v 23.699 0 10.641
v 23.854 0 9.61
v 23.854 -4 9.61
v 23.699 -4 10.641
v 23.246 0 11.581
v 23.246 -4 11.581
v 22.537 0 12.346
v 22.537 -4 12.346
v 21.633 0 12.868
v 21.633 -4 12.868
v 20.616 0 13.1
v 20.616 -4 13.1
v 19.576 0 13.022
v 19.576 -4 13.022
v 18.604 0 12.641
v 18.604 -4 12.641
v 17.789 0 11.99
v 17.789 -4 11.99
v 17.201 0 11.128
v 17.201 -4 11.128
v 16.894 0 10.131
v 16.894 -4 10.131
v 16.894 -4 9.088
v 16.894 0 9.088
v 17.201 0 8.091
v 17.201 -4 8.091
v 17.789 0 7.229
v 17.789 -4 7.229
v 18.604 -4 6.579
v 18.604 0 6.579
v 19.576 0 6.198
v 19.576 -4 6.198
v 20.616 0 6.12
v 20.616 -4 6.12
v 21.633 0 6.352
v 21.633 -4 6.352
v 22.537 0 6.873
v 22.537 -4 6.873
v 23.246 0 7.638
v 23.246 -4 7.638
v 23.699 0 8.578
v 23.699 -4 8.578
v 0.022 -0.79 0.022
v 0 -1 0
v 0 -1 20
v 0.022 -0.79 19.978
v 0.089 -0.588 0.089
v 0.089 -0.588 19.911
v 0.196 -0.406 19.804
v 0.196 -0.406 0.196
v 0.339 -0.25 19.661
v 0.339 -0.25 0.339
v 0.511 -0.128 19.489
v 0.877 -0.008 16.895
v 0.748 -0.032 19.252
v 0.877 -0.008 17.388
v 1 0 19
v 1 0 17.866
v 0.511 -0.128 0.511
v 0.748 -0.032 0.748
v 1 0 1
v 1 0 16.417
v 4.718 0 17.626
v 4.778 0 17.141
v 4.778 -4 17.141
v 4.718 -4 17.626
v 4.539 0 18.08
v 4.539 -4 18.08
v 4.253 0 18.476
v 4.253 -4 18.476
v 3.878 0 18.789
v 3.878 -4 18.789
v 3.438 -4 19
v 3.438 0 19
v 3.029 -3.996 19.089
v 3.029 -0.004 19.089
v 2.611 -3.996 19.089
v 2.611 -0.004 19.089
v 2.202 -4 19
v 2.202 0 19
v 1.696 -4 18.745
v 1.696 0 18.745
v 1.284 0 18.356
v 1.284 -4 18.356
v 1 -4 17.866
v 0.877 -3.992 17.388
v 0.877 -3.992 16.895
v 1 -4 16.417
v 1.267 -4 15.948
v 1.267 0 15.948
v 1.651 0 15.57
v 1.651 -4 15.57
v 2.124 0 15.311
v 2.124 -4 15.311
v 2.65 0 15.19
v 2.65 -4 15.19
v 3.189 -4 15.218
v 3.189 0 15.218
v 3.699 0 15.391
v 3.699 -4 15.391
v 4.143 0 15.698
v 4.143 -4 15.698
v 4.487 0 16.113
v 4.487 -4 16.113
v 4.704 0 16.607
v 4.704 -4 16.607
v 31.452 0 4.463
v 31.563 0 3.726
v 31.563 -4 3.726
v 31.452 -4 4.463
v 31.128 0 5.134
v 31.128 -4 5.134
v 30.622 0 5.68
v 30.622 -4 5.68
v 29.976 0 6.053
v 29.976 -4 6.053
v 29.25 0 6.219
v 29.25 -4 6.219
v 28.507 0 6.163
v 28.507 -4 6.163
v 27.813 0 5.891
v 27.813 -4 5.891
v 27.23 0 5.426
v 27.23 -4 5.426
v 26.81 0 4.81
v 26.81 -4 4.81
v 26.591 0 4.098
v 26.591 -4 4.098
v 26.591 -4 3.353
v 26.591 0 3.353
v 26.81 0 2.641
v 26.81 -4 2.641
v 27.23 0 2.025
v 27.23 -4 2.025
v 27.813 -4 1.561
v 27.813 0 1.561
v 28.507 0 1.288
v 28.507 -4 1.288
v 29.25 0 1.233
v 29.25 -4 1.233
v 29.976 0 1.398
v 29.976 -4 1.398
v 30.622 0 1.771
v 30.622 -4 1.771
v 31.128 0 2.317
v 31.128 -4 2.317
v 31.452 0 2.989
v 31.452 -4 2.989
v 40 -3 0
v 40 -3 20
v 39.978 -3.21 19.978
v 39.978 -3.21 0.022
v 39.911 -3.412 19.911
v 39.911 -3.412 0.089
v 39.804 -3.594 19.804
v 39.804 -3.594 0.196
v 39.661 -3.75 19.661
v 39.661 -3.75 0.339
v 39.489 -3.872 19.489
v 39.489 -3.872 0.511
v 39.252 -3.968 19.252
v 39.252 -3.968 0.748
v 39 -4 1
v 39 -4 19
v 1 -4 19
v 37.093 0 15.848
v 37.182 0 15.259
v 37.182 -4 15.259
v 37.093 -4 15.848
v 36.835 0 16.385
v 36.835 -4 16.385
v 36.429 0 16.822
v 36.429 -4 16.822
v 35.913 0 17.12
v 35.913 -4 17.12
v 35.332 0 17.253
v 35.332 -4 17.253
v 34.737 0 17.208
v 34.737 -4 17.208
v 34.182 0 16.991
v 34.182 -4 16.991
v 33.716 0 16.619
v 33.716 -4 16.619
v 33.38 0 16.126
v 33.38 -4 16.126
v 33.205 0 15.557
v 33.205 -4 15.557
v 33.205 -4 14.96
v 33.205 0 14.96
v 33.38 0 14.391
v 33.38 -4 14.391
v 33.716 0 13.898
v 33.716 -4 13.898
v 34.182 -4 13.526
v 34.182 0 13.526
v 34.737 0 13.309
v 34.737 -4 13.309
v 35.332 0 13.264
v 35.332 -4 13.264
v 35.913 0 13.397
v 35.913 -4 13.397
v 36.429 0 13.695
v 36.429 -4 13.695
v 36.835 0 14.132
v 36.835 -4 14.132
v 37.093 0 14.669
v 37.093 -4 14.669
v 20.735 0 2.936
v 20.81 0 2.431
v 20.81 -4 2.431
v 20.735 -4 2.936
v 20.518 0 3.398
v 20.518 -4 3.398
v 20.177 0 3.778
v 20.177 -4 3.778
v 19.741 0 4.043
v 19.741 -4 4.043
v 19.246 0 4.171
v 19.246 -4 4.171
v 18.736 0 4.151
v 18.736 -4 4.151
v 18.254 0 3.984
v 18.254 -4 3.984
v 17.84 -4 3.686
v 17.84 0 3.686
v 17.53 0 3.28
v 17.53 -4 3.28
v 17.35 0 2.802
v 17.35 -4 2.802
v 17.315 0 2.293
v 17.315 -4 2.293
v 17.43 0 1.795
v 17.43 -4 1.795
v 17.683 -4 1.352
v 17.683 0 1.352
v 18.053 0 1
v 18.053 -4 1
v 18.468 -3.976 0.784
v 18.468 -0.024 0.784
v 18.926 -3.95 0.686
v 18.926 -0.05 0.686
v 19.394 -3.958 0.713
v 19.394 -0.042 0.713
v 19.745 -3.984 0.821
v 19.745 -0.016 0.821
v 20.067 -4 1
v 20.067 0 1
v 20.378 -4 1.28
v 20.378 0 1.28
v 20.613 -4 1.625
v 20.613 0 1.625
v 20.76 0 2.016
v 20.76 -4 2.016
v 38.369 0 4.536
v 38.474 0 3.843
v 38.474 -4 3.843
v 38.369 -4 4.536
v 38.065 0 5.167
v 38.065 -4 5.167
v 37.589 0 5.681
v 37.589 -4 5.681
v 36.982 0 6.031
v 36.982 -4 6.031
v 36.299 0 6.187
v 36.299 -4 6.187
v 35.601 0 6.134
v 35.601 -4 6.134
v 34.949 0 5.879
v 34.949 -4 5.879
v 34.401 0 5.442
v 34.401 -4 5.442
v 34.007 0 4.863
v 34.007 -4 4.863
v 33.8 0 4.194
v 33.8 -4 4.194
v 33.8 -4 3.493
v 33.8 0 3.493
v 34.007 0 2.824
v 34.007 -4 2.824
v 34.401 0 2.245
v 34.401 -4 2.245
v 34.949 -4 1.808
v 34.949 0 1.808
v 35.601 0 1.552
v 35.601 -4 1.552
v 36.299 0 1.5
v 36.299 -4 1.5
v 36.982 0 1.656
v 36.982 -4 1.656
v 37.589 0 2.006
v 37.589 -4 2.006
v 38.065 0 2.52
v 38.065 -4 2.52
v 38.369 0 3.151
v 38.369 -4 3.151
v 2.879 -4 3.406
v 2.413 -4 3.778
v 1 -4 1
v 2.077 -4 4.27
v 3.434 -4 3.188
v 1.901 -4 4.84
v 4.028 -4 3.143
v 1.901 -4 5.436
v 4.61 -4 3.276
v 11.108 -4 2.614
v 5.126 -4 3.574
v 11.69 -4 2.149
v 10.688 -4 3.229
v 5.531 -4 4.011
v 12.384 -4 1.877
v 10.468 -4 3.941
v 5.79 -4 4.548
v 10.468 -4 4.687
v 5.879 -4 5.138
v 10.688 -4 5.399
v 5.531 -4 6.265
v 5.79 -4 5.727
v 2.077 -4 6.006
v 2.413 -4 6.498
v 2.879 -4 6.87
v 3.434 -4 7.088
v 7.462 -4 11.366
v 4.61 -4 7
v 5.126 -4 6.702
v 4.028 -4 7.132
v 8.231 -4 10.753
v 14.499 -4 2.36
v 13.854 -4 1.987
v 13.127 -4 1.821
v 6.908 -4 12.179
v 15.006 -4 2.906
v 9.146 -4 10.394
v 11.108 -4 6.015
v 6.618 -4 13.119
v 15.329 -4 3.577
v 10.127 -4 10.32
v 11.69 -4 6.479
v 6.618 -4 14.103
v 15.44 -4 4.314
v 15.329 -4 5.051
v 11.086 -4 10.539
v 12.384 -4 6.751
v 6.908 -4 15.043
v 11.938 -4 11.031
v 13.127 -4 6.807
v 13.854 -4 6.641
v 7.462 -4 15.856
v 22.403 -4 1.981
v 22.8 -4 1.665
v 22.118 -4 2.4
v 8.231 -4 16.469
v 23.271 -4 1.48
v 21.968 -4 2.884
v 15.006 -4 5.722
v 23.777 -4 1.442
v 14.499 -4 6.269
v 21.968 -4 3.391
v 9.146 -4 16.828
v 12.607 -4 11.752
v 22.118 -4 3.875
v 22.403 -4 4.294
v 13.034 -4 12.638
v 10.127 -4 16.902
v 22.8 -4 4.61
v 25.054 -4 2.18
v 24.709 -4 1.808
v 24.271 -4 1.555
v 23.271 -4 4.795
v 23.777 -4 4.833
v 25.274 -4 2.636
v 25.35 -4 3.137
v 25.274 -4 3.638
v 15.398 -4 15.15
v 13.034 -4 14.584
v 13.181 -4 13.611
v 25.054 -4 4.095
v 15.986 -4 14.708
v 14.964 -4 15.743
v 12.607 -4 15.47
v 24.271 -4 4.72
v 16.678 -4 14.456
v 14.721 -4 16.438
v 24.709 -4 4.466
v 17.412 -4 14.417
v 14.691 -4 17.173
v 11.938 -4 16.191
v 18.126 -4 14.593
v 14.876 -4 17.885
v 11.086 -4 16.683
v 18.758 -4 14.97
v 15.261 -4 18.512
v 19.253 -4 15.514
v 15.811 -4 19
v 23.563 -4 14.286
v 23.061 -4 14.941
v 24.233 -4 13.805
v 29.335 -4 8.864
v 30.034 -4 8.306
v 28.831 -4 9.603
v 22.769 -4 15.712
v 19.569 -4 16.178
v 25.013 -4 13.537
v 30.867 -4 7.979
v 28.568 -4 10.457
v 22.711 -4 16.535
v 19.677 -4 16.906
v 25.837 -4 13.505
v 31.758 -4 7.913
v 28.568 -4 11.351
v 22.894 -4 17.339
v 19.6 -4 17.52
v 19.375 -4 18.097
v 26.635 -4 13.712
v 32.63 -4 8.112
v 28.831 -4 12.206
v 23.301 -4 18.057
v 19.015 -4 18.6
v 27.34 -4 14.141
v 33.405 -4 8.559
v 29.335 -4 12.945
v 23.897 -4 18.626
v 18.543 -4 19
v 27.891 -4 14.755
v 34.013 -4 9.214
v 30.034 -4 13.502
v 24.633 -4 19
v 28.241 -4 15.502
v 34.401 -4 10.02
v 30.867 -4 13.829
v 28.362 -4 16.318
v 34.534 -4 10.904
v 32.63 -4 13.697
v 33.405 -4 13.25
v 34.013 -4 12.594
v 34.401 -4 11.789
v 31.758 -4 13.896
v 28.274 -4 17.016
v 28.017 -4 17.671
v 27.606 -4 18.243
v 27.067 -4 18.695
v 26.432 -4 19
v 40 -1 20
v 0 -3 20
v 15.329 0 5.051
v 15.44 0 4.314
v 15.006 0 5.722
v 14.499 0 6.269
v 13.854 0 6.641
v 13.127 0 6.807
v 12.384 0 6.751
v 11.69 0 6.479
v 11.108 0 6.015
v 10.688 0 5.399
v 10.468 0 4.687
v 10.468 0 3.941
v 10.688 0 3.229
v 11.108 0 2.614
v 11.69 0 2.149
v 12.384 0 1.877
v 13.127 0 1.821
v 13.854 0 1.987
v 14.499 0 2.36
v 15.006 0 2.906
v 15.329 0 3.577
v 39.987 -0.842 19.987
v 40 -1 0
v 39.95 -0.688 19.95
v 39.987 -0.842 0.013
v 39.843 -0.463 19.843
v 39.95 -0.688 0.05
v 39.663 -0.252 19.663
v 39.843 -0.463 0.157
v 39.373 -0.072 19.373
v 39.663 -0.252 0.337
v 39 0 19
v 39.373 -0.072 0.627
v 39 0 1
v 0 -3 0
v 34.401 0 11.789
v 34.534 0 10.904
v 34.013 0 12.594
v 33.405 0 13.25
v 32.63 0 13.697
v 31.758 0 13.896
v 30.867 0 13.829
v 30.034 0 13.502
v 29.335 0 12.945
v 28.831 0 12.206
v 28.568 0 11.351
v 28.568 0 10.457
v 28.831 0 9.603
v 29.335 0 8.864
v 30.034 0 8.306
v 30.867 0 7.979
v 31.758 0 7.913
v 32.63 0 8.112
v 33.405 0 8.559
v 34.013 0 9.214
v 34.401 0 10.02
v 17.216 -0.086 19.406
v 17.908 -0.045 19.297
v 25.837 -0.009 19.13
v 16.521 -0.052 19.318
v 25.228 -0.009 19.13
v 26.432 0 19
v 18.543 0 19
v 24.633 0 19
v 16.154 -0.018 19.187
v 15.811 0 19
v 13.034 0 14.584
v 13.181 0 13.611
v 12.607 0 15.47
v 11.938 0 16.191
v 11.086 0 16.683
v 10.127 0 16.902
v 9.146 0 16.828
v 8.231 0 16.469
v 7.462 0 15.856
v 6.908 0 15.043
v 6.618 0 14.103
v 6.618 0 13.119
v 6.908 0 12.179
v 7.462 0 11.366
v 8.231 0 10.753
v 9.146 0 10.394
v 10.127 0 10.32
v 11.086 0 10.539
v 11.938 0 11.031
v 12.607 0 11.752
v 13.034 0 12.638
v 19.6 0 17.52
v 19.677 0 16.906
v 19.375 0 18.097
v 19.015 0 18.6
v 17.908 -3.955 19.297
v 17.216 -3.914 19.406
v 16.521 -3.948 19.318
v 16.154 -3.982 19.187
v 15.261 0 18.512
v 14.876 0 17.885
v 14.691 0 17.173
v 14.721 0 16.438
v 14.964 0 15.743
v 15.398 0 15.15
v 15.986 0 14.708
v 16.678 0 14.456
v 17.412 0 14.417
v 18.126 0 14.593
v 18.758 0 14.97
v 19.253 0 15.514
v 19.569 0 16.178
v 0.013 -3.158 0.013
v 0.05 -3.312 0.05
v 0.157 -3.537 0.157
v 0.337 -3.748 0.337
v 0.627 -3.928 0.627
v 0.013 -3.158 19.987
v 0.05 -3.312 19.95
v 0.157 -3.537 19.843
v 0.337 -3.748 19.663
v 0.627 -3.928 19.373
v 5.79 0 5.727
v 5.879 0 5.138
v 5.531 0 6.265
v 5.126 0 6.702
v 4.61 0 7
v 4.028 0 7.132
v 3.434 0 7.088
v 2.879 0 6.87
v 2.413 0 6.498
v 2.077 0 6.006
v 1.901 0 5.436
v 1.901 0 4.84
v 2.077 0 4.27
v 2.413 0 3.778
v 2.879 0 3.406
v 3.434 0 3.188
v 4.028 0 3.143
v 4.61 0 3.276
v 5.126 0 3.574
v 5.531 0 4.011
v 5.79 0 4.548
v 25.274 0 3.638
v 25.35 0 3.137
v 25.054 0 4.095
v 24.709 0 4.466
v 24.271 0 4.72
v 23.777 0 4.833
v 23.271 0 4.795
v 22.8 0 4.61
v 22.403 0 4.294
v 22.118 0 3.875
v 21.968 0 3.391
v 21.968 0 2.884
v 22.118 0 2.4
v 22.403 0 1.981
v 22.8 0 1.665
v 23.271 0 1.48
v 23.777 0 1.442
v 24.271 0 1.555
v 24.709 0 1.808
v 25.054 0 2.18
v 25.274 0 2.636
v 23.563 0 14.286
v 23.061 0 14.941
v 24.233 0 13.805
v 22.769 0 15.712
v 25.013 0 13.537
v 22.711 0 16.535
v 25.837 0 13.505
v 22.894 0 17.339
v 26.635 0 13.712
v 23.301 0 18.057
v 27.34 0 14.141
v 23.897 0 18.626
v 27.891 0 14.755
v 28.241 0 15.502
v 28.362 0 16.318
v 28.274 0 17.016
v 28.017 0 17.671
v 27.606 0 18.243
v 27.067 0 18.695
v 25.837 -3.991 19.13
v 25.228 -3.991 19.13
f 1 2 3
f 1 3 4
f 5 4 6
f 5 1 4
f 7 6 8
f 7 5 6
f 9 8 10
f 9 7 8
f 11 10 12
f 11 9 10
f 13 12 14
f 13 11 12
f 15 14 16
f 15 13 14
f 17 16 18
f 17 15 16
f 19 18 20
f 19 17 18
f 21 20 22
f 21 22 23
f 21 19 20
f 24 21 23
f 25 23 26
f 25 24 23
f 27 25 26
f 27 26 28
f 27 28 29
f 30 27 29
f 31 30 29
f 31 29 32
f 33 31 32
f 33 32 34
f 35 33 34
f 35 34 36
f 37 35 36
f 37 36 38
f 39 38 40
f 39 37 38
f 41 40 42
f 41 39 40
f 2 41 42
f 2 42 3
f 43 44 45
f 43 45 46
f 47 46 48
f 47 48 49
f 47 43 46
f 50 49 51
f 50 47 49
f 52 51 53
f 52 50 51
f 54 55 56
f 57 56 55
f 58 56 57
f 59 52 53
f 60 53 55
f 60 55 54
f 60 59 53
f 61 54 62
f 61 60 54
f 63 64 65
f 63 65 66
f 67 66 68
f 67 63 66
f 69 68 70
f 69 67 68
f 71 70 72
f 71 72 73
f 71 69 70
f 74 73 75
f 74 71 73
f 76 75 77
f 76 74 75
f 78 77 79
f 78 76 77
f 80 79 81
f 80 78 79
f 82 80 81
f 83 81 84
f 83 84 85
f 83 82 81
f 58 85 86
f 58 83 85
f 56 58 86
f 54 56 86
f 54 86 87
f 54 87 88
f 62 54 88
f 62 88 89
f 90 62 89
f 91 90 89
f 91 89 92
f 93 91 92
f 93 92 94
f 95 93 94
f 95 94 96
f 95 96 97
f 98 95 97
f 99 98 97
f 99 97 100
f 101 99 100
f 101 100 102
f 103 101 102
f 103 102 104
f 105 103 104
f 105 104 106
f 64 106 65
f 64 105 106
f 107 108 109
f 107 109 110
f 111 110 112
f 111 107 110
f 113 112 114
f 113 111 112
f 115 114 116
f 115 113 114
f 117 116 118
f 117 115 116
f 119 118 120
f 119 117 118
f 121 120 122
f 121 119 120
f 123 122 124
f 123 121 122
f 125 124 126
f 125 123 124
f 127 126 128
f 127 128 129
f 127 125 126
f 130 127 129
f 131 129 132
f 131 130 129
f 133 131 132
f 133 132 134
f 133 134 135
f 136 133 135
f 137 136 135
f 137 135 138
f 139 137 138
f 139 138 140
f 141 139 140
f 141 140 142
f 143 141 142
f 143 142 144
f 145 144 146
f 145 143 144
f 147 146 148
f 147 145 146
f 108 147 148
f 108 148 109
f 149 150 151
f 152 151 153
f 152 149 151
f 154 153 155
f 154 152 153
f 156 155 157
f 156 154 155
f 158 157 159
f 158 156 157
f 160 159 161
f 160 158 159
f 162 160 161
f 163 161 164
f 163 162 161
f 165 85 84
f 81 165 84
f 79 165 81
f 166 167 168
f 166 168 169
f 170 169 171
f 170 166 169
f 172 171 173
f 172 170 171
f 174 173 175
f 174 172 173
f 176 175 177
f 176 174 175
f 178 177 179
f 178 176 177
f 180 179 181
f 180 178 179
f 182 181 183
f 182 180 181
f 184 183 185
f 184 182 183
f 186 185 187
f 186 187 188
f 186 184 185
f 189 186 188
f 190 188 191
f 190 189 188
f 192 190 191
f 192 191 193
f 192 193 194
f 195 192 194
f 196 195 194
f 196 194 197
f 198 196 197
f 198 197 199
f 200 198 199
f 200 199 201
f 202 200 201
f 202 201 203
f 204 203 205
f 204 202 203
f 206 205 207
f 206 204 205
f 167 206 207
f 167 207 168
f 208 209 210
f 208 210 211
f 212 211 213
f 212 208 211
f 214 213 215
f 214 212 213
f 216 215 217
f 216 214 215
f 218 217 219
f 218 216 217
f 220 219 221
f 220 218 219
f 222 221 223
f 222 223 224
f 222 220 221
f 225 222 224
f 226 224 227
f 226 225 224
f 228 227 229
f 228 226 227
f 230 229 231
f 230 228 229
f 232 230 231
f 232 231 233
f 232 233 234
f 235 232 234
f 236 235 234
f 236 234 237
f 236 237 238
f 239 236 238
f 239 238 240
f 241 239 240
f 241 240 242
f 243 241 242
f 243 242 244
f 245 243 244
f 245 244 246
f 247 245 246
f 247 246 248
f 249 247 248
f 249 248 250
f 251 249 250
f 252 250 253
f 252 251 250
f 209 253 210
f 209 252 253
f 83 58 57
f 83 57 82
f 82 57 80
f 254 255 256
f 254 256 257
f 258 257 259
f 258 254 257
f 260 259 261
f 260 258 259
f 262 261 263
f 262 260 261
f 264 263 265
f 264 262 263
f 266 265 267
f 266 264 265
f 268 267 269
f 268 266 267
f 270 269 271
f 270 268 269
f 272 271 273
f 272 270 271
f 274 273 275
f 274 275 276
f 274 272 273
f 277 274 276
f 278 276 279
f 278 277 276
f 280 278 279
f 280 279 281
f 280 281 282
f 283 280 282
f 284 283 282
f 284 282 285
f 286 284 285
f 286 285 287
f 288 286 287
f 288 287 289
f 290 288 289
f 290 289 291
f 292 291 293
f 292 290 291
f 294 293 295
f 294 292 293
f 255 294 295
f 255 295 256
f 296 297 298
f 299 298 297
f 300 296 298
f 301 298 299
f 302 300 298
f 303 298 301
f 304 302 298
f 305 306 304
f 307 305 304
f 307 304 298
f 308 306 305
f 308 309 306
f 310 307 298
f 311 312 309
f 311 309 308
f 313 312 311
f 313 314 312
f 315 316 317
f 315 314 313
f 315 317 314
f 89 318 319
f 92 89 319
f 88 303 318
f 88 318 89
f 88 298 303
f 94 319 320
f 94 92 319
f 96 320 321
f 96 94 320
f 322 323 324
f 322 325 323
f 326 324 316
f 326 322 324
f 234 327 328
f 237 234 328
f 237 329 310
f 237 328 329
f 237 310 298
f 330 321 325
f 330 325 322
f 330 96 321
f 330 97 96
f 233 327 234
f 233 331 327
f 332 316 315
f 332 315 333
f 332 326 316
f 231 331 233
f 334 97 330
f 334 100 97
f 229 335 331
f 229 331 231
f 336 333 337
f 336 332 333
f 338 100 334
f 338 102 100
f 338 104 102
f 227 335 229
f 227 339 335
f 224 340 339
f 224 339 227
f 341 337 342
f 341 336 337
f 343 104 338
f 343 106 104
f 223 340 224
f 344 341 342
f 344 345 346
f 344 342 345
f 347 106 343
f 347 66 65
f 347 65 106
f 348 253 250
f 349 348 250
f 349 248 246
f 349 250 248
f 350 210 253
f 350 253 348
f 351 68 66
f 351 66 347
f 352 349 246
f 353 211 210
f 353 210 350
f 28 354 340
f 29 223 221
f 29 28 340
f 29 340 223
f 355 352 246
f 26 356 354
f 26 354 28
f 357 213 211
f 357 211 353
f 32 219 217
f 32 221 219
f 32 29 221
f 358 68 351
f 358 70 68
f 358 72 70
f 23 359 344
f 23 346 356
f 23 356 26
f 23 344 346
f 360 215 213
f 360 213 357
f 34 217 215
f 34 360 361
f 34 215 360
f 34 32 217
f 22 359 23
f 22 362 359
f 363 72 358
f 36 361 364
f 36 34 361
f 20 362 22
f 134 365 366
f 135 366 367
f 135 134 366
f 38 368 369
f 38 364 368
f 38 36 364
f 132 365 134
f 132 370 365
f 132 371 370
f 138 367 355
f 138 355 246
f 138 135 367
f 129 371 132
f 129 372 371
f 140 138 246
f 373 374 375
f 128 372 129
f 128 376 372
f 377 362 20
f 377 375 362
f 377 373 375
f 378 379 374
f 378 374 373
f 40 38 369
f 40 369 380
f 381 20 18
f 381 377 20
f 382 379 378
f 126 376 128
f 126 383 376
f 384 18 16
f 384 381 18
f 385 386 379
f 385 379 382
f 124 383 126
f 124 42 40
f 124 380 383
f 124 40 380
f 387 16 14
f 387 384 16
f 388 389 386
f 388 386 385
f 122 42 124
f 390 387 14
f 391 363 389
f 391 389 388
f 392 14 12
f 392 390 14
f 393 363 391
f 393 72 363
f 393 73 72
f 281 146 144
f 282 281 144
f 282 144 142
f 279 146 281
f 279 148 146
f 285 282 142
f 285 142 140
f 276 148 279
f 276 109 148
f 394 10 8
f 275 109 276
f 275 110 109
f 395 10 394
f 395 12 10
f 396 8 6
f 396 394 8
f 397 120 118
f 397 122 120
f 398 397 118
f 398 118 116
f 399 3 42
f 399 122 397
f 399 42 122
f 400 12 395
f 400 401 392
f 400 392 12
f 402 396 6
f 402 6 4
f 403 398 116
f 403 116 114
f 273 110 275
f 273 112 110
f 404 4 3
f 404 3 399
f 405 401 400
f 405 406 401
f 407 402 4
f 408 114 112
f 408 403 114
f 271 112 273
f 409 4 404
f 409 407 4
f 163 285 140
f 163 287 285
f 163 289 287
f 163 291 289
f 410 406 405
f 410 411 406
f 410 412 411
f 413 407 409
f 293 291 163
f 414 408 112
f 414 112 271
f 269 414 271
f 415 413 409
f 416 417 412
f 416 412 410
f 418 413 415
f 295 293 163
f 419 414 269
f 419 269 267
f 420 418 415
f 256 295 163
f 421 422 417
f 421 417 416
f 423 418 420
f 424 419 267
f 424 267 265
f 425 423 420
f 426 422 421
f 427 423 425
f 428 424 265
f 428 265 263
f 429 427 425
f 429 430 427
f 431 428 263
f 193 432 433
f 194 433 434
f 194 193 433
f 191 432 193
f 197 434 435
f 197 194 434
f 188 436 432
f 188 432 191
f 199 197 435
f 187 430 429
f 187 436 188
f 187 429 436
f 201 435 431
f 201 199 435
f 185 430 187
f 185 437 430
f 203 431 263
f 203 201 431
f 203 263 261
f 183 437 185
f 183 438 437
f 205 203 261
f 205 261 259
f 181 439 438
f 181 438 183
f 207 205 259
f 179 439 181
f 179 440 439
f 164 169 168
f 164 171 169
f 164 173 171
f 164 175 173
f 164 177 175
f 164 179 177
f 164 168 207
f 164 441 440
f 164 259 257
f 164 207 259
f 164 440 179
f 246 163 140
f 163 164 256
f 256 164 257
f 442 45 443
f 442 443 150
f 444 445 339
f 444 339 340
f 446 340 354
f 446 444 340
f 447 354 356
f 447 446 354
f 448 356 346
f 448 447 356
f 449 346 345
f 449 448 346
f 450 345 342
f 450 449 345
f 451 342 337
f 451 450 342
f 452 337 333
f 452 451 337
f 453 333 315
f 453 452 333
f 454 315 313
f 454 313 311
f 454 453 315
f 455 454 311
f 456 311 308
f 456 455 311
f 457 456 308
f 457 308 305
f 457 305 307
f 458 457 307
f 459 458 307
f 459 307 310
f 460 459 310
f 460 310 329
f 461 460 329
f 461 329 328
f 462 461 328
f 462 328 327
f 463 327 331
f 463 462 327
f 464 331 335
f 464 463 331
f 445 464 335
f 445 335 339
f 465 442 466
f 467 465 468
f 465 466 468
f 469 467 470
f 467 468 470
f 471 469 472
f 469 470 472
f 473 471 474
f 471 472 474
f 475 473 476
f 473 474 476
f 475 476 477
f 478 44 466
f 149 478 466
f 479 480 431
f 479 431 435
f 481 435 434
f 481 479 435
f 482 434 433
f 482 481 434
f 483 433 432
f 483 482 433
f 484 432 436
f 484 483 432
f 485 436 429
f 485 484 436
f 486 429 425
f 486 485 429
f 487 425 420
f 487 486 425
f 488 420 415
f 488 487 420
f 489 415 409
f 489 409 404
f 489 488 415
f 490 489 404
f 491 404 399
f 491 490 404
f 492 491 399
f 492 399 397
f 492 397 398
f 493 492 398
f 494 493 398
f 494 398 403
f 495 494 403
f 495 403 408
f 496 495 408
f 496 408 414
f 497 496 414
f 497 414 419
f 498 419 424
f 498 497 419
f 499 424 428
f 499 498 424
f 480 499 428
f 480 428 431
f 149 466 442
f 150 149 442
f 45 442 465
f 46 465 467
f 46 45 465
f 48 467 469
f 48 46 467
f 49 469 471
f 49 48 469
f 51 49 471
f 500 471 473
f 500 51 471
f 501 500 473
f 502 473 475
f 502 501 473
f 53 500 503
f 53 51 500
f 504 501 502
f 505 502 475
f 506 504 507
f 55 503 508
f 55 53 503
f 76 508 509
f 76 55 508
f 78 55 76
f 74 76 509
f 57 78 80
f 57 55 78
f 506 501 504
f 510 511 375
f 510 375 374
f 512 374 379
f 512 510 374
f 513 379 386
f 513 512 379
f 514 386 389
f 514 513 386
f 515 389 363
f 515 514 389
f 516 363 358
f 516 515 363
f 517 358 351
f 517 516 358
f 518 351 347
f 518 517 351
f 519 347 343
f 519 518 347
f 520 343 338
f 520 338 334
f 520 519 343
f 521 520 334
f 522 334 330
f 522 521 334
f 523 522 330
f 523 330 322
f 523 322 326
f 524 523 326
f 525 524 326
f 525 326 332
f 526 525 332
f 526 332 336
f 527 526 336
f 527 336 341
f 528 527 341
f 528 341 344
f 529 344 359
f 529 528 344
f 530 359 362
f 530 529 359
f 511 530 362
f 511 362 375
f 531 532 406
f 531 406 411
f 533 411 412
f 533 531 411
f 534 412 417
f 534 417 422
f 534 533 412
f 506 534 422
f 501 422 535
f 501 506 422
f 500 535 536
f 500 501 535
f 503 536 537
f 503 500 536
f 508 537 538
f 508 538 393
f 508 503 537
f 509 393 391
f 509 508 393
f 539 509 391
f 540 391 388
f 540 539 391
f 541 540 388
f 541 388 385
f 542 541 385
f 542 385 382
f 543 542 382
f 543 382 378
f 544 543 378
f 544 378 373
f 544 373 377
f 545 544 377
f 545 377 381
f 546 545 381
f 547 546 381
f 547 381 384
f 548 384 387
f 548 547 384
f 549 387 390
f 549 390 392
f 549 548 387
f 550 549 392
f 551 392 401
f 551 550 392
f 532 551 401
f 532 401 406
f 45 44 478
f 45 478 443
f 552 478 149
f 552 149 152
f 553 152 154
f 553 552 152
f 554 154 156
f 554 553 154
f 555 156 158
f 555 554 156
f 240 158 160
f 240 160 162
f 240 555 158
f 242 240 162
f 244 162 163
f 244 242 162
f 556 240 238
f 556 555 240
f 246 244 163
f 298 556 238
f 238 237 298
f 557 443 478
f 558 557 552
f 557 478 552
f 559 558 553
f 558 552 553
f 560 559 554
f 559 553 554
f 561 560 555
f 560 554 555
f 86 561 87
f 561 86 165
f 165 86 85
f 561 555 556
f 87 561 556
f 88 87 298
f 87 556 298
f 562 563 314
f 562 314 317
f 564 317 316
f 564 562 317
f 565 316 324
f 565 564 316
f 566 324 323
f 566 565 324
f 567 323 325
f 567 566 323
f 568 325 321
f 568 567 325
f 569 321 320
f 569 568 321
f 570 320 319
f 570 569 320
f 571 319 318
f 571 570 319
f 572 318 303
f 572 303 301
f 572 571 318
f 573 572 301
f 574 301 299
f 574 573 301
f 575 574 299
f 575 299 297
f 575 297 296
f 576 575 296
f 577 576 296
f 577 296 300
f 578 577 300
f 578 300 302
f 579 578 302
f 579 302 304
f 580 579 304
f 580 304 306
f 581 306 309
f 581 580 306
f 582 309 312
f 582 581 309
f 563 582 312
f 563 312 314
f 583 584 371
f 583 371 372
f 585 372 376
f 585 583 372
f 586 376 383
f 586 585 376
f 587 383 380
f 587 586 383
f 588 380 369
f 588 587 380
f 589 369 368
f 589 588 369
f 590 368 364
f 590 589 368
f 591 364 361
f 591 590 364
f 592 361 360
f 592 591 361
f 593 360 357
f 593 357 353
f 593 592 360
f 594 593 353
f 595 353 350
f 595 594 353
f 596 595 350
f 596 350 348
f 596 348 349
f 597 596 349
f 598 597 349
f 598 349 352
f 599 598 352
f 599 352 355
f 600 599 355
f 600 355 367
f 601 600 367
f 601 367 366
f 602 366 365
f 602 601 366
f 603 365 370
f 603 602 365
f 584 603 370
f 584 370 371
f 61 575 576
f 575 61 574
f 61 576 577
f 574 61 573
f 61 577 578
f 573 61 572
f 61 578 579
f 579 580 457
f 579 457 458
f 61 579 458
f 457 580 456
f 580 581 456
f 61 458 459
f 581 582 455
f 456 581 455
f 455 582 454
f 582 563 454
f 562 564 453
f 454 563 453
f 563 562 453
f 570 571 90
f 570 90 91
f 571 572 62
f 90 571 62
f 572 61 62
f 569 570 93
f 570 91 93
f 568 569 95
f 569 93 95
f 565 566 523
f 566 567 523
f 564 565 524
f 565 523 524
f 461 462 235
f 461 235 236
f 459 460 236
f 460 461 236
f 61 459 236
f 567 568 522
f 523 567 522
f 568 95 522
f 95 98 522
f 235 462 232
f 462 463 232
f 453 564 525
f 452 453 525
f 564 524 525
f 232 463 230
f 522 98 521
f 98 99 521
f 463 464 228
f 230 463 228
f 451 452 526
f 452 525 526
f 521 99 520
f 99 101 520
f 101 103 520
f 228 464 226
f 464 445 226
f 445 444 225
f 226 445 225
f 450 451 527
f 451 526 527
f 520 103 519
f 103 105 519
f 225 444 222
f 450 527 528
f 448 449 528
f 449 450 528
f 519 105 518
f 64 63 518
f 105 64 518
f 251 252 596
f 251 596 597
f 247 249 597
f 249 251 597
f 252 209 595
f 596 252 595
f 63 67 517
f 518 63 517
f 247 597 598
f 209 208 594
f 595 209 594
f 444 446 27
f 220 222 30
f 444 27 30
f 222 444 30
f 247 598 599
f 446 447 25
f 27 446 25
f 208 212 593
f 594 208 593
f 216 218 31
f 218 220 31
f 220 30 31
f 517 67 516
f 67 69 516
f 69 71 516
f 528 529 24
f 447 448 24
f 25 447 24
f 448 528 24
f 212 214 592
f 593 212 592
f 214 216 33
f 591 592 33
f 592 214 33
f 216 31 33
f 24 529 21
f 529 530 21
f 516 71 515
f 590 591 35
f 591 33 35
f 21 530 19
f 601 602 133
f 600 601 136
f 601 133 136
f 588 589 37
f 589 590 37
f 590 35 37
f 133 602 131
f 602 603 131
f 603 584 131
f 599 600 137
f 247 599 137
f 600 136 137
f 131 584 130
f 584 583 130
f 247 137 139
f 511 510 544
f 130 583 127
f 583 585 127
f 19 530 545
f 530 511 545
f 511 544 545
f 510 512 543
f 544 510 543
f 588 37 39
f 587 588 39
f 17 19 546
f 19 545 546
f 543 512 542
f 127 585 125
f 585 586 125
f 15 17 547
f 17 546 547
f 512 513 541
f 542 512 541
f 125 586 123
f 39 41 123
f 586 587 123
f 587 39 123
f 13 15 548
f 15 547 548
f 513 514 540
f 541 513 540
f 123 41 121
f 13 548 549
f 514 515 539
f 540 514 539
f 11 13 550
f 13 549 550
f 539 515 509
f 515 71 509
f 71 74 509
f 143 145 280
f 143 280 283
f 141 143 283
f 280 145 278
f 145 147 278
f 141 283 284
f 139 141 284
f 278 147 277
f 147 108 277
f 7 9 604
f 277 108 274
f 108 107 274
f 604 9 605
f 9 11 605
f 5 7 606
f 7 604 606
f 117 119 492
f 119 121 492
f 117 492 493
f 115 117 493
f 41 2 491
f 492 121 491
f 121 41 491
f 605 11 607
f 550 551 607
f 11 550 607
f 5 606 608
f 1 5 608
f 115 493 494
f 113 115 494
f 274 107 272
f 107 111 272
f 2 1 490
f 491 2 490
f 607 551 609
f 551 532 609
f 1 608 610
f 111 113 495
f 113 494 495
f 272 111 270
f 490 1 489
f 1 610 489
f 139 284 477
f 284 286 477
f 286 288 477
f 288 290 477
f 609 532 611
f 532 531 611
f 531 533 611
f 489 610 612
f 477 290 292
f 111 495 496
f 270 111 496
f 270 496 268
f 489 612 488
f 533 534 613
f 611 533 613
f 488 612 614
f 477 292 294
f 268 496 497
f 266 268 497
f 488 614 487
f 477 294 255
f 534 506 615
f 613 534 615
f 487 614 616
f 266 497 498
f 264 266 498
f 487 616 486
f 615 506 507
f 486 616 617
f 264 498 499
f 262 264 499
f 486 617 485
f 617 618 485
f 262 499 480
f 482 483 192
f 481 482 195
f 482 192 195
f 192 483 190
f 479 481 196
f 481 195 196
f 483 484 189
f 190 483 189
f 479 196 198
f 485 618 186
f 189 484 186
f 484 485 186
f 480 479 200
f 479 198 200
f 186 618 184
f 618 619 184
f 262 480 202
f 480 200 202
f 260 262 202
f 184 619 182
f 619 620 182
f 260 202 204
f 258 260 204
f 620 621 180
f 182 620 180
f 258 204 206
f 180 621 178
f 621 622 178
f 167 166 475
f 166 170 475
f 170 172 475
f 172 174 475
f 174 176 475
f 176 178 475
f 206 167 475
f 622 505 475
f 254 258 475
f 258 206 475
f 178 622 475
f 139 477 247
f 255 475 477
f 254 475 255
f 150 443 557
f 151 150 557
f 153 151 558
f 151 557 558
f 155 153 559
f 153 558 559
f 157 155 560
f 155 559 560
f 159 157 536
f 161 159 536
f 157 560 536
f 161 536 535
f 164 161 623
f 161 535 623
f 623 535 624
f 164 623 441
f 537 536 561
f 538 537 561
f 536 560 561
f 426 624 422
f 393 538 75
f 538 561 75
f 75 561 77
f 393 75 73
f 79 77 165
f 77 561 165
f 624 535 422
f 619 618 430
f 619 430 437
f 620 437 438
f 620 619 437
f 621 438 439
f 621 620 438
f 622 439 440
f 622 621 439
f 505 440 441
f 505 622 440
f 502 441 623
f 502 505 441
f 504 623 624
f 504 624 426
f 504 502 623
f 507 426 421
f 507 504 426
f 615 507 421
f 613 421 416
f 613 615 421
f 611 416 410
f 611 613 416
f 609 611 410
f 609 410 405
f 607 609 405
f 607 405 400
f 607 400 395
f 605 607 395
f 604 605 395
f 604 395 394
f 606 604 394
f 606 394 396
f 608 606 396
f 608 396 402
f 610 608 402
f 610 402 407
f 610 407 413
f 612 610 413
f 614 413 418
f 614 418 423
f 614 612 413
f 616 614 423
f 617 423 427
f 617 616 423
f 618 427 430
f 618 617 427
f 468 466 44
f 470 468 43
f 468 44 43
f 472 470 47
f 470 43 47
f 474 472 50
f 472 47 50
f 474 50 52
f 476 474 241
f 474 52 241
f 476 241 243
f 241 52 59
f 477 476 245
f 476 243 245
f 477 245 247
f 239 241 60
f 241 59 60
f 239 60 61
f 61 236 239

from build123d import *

# Parameters (mm, degrees)
F0_W        = 40
F0_H        = 20
F0_R        = 1.75
F0_R_2      = 2.5
F0_R_3      = 2
F0_R_4      = 1.7
F0_R_5      = 2.35
F0_R_6      = 3.5
F0_R_7      = 3.3
F0_R_8      = 1.9586185138
F0_R_9      = 3
F0_R_10     = 2.8292671529
F1_DEPTH    = 4
F2_T1_DEPTH = 25
F2_T3_DEPTH = 45


# Not quite as in the source:
# - a fillet or chamfer that OpenCascade refuses, or shapes differently, is made with other operations: its cross-section is extruded or revolved along the edge and cut away or added


with BuildPart() as f1:
    # F0 (on Front) → F1 (new body)
    with BuildSketch(Plane.XZ):
        with Locations((20, 10)):
            Rectangle(F0_W, F0_H)
        with Locations((19.0599078035, 2.4311765472)):
            Circle(F0_R, mode=Mode.SUBTRACT)
        with Locations((12.9404438354, 4.3140889982)):
            Circle(F0_R_2, mode=Mode.SUBTRACT)
        with Locations((3.878928961, 5.1378629939)):
            Circle(F0_R_3, mode=Mode.SUBTRACT)
        with Locations((23.6495067011, 3.1372687739)):
            Circle(F0_R_4, mode=Mode.SUBTRACT)
        with Locations((29.0628805159, 3.7256787709)):
            Circle(F0_R_2, mode=Mode.SUBTRACT)
        with Locations((36.1237967933, 3.8433607703)):
            Circle(F0_R_5, mode=Mode.SUBTRACT)
        with Locations((20.3544088753, 9.6097794314)):
            Circle(F0_R_6, mode=Mode.SUBTRACT)
        with Locations((9.8807118513, 13.6109674106)):
            Circle(F0_R_7, mode=Mode.SUBTRACT)
        with Locations((2.8197907362, 17.1414283137)):
            Circle(F0_R_8, mode=Mode.SUBTRACT)
        with Locations((17.1769958133, 16.9060624719)):
            Circle(F0_R_2, mode=Mode.SUBTRACT)
        with Locations((31.5342015816, 10.9042814246)):
            Circle(F0_R_9, mode=Mode.SUBTRACT)
        with Locations((25.5324186913, 16.3176533965)):
            Circle(F0_R_10, mode=Mode.SUBTRACT)
        with Locations((35.1823444841, 15.2585163235)):
            Circle(F0_R_3, mode=Mode.SUBTRACT)
    extrude(amount=F1_DEPTH)

    # F2: fillet of radius 1 on 8 edges, made by hand

    # F2_s2 → F2_t1 (cut)
    with BuildSketch(Plane.XY.offset(-2.5)):
        with BuildLine():
            ThreePointArc((0, -3), (0.2928932188, -3.7071067812), (1, -4))
            Line((1, -4), (0, -4))
            Line((0, -4), (0, -3))
        make_face()
        with BuildLine():
            ThreePointArc((40, -3), (39.7071067812, -3.7071067812), (39, -4))
            Line((39, -4), (40, -4))
            Line((40, -4), (40, -3))
        make_face()
        with BuildLine():
            ThreePointArc((0, -1), (0.2928932188, -0.2928932188), (1, 0))
            Line((1, 0), (0, 0))
            Line((0, 0), (0, -1))
        make_face()
        with BuildLine():
            ThreePointArc((40, -1), (39.7071067812, -0.2928932188), (39, 0))
            Line((39, 0), (40, 0))
            Line((40, 0), (40, -1))
        make_face()
    extrude(amount=F2_T1_DEPTH, mode=Mode.SUBTRACT)

    # F2_s4 → F2_t3 (cut)
    with BuildSketch(Plane.YZ.offset(-2.5)):
        with BuildLine():
            ThreePointArc((-3, 20), (-3.7071067812, 19.7071067812), (-4, 19))
            Line((-4, 19), (-4, 20))
            Line((-4, 20), (-3, 20))
        make_face()
        with BuildLine():
            ThreePointArc((-3, 0), (-3.7071067812, 0.2928932188), (-4, 1))
            Line((-4, 1), (-4, 0))
            Line((-4, 0), (-3, 0))
        make_face()
        with BuildLine():
            ThreePointArc((-1, 20), (-0.2928932188, 19.7071067812), (0, 19))
            Line((0, 19), (0, 20))
            Line((0, 20), (-1, 20))
        make_face()
        with BuildLine():
            ThreePointArc((-1, 0), (-0.2928932188, 0.2928932188), (0, 1))
            Line((0, 1), (0, 0))
            Line((0, 0), (-1, 0))
        make_face()
    extrude(amount=F2_T3_DEPTH, mode=Mode.SUBTRACT)


solid = f1.part
